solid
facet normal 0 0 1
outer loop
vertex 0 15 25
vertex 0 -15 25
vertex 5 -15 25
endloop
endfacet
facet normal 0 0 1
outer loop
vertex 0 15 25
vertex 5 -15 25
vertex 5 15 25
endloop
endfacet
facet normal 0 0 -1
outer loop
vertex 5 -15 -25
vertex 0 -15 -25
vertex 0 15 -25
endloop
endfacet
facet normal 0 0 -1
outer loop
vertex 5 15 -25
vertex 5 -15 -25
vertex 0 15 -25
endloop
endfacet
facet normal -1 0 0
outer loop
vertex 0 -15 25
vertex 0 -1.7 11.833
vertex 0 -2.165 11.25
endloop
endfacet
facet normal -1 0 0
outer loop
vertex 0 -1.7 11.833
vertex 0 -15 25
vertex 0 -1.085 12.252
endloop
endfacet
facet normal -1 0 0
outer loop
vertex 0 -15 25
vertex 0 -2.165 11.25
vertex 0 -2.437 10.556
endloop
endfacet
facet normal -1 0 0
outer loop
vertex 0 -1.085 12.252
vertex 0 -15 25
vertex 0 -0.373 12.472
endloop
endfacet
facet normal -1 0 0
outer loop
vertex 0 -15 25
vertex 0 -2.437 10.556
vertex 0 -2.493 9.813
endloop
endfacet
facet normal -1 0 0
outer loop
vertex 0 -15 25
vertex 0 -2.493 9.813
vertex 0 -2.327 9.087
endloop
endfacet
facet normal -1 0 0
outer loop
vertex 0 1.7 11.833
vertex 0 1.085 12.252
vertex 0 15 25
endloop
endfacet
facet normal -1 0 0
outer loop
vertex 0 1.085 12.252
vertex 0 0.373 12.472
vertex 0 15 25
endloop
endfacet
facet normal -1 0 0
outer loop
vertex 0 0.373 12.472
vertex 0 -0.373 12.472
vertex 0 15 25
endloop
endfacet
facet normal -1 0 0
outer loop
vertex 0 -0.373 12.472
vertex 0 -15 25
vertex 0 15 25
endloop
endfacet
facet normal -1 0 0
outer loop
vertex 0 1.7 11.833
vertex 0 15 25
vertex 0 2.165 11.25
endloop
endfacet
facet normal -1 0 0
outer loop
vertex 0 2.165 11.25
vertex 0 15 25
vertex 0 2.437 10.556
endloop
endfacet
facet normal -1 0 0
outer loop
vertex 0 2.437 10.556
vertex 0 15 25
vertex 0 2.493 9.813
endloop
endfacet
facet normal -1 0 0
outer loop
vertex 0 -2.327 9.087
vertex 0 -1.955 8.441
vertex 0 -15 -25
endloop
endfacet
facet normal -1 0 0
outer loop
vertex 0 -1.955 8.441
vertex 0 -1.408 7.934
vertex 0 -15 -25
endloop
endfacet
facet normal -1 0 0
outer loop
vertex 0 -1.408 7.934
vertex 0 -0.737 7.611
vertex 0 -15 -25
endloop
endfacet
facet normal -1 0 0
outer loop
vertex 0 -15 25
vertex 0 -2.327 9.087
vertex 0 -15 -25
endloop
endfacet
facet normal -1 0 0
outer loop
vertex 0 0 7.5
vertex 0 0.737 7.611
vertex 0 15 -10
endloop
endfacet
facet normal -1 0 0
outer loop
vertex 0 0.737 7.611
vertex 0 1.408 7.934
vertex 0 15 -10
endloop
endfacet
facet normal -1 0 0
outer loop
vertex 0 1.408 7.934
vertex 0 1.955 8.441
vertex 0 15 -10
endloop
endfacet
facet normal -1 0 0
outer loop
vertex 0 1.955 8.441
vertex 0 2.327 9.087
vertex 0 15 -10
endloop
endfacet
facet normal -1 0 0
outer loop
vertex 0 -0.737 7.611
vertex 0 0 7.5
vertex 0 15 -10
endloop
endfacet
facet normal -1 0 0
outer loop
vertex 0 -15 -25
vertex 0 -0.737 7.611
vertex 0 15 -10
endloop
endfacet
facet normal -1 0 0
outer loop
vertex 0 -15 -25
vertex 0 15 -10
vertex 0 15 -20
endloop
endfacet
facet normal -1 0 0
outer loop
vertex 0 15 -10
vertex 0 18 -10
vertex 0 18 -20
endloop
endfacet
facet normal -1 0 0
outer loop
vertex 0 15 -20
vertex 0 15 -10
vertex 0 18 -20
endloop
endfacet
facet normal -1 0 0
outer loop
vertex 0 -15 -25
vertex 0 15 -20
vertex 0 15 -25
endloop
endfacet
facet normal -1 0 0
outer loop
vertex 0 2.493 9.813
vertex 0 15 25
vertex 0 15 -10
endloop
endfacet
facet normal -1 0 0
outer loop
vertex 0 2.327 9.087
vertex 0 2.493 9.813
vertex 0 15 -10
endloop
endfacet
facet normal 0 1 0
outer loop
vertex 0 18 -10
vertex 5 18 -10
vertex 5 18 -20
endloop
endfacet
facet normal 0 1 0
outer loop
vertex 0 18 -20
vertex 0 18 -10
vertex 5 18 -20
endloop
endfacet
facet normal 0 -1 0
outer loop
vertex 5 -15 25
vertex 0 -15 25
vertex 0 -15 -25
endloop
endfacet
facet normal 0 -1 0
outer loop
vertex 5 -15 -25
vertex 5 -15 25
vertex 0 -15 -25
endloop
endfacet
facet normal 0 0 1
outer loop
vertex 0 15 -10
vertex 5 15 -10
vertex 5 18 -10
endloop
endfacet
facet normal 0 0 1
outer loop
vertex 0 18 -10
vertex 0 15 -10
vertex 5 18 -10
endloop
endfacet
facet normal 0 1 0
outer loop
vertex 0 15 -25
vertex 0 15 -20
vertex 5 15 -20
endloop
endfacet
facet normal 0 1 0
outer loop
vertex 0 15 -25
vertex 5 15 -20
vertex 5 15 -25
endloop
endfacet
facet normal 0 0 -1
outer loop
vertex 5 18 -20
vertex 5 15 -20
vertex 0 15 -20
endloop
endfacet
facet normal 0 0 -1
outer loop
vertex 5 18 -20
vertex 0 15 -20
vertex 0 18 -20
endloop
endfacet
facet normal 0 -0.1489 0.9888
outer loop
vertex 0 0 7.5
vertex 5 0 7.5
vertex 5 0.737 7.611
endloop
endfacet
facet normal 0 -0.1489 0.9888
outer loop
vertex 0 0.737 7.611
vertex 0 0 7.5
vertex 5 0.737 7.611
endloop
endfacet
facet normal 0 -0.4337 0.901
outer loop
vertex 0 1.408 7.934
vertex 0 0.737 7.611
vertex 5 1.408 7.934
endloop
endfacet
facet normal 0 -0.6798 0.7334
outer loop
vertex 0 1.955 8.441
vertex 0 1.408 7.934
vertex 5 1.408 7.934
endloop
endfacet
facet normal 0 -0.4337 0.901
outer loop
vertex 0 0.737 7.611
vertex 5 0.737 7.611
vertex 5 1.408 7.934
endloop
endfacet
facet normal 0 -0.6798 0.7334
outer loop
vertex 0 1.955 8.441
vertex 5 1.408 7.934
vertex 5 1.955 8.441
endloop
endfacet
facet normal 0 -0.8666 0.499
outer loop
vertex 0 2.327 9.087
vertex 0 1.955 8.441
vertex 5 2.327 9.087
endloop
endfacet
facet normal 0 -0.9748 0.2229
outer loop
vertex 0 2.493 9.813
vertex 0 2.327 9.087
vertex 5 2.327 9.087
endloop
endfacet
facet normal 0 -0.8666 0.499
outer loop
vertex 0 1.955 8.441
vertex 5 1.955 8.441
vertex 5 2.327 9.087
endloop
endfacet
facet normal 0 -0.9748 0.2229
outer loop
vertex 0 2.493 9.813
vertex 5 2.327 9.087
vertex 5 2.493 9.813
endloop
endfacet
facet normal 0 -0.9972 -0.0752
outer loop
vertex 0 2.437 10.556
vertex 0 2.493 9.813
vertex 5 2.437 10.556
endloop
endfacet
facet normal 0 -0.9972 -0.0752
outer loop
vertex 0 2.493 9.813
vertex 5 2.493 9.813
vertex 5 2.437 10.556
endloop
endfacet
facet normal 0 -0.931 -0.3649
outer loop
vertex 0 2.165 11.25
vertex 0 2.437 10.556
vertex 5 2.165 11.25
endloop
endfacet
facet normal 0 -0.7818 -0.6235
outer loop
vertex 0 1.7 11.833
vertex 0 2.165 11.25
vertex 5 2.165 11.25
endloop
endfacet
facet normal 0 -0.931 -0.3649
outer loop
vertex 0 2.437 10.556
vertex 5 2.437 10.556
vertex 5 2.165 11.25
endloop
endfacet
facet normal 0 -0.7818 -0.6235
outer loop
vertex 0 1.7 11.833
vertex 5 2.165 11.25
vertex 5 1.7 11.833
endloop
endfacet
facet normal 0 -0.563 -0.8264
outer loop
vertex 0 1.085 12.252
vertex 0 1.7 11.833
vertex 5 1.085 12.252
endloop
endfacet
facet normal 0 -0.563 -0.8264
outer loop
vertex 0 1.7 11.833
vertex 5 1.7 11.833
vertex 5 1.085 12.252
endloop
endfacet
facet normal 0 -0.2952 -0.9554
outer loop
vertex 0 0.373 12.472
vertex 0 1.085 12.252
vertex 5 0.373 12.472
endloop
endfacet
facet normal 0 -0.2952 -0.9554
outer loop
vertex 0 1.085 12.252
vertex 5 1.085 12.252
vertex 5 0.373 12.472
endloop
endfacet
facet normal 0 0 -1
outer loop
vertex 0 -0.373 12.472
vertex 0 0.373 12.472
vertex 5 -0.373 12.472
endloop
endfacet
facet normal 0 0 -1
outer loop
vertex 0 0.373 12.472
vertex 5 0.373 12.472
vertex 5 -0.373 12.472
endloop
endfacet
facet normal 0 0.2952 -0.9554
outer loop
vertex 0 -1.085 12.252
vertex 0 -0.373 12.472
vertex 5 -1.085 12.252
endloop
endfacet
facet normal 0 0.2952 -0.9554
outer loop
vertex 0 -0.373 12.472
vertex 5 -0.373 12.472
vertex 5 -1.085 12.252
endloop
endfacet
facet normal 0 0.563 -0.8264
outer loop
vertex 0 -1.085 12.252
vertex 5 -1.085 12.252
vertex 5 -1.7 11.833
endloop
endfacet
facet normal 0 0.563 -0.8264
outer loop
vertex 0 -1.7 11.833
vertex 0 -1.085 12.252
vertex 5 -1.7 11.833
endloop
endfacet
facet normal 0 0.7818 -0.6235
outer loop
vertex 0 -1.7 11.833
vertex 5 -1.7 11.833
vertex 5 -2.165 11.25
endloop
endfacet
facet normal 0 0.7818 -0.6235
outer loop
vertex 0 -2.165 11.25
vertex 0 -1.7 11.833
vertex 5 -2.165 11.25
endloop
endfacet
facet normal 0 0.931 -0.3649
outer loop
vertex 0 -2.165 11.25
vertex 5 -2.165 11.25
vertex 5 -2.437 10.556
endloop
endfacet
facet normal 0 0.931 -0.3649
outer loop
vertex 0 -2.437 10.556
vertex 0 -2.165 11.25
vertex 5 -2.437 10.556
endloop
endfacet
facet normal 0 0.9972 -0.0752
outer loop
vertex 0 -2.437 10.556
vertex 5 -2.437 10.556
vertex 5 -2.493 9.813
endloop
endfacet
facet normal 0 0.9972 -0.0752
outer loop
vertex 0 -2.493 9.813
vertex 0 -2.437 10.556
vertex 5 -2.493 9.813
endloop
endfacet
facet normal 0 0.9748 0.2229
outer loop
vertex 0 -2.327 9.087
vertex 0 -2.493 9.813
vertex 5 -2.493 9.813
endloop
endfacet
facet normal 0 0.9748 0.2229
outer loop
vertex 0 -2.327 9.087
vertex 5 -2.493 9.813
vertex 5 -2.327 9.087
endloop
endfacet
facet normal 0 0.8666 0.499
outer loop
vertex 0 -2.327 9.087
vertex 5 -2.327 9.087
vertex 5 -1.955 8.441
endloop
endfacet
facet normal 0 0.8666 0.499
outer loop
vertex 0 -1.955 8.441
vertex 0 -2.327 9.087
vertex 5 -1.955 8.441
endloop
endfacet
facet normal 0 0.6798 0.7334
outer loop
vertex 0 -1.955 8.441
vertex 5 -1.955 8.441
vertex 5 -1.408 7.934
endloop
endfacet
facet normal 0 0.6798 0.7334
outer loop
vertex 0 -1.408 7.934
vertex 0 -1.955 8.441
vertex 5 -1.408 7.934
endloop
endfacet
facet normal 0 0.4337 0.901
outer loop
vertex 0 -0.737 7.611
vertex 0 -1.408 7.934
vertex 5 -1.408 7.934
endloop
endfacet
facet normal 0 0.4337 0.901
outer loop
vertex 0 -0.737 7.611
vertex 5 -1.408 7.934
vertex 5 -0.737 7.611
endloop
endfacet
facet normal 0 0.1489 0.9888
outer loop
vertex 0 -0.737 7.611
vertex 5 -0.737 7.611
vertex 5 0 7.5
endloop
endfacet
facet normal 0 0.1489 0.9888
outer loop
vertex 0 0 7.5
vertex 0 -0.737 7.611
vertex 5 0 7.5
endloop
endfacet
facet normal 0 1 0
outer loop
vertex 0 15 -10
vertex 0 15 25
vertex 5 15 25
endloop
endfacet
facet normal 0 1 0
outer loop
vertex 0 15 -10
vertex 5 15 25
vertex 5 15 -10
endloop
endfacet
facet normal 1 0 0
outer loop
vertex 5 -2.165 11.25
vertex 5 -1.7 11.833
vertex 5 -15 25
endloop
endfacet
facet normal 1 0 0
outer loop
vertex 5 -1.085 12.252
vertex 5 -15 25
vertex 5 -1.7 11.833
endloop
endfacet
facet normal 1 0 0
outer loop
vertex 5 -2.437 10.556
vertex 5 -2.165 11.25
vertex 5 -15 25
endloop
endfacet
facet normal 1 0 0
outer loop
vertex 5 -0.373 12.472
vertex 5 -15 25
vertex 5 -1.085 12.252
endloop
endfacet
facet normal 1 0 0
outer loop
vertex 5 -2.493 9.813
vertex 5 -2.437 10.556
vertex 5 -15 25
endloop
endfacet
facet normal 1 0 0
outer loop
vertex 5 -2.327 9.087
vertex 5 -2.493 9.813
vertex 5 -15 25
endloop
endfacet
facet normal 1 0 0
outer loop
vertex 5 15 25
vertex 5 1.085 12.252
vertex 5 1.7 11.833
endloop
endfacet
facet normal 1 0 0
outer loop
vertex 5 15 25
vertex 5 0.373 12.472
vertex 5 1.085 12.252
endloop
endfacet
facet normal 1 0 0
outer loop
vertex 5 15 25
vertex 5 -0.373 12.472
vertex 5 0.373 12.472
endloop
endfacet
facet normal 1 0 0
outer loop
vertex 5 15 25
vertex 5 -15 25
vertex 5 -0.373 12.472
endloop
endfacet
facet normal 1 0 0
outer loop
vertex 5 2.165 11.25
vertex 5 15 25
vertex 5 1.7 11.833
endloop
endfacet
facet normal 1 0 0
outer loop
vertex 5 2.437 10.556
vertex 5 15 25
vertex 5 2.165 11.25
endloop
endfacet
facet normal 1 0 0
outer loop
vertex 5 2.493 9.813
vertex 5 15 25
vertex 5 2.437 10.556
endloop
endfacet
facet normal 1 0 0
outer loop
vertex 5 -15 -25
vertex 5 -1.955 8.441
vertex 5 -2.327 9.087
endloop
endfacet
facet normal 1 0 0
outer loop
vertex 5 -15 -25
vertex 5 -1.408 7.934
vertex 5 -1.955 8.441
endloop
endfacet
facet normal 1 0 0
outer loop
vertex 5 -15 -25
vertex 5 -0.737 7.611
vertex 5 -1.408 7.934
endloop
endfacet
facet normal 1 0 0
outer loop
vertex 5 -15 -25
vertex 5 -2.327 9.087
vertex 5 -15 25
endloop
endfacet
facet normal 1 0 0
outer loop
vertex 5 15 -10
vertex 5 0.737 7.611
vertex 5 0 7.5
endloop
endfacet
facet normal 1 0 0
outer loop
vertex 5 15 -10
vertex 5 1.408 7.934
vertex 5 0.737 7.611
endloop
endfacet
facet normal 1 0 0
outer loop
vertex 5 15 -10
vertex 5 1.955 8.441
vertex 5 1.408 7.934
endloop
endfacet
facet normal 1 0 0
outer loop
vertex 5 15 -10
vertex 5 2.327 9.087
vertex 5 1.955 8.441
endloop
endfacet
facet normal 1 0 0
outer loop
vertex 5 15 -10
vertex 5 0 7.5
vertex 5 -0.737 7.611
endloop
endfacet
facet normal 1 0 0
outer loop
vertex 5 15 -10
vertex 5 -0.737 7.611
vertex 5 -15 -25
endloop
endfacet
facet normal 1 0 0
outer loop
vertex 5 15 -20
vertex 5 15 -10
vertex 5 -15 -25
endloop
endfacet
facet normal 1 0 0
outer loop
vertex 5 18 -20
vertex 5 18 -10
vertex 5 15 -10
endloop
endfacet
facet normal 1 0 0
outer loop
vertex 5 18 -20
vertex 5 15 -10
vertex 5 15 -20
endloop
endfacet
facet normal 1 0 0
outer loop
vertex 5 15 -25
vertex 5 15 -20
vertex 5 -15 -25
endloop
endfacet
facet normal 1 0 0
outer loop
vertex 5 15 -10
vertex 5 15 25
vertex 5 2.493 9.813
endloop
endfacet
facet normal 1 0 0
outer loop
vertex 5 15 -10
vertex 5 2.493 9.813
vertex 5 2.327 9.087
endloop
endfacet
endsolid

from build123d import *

# Parameters (mm, degrees)
SKETCH1_W          = 50
SKETCH1_H          = 30
EXTRUDE1_DEPTH     = 5
SKETCH2_W          = 10
SKETCH2_H          = 3
EXTRUDE2_DEPTH     = 5
SKETCH3_R          = 2.5
CUT_EXTRUDE1_DEPTH = 32.208973069


with BuildPart() as part:
    # Sketch1 → Extrude1 (new body)
    with BuildSketch(Plane(origin=(0, 0, 0), x_dir=(0, 0, -1), z_dir=(1, 0, 0))):
        Rectangle(SKETCH1_W, SKETCH1_H)
    extrude(amount=EXTRUDE1_DEPTH)

    # Sketch2 → Extrude2 (add)
    with BuildSketch(Plane(origin=(5, 0, 0), x_dir=(0, 0, -1), z_dir=(1, 0, 0))):
        with Locations((15, 16.5)):
            Rectangle(SKETCH2_W, SKETCH2_H)
    extrude(amount=-EXTRUDE2_DEPTH)

    # Sketch3 → Cut-Extrude1 (cut, through all)
    with BuildSketch(Plane(origin=(5, 0, 0), x_dir=(0, 0, -1), z_dir=(1, 0, 0))):
        with Locations((-10, 0)):
            Circle(SKETCH3_R)
    extrude(amount=-CUT_EXTRUDE1_DEPTH, mode=Mode.SUBTRACT)


solid = part.part
